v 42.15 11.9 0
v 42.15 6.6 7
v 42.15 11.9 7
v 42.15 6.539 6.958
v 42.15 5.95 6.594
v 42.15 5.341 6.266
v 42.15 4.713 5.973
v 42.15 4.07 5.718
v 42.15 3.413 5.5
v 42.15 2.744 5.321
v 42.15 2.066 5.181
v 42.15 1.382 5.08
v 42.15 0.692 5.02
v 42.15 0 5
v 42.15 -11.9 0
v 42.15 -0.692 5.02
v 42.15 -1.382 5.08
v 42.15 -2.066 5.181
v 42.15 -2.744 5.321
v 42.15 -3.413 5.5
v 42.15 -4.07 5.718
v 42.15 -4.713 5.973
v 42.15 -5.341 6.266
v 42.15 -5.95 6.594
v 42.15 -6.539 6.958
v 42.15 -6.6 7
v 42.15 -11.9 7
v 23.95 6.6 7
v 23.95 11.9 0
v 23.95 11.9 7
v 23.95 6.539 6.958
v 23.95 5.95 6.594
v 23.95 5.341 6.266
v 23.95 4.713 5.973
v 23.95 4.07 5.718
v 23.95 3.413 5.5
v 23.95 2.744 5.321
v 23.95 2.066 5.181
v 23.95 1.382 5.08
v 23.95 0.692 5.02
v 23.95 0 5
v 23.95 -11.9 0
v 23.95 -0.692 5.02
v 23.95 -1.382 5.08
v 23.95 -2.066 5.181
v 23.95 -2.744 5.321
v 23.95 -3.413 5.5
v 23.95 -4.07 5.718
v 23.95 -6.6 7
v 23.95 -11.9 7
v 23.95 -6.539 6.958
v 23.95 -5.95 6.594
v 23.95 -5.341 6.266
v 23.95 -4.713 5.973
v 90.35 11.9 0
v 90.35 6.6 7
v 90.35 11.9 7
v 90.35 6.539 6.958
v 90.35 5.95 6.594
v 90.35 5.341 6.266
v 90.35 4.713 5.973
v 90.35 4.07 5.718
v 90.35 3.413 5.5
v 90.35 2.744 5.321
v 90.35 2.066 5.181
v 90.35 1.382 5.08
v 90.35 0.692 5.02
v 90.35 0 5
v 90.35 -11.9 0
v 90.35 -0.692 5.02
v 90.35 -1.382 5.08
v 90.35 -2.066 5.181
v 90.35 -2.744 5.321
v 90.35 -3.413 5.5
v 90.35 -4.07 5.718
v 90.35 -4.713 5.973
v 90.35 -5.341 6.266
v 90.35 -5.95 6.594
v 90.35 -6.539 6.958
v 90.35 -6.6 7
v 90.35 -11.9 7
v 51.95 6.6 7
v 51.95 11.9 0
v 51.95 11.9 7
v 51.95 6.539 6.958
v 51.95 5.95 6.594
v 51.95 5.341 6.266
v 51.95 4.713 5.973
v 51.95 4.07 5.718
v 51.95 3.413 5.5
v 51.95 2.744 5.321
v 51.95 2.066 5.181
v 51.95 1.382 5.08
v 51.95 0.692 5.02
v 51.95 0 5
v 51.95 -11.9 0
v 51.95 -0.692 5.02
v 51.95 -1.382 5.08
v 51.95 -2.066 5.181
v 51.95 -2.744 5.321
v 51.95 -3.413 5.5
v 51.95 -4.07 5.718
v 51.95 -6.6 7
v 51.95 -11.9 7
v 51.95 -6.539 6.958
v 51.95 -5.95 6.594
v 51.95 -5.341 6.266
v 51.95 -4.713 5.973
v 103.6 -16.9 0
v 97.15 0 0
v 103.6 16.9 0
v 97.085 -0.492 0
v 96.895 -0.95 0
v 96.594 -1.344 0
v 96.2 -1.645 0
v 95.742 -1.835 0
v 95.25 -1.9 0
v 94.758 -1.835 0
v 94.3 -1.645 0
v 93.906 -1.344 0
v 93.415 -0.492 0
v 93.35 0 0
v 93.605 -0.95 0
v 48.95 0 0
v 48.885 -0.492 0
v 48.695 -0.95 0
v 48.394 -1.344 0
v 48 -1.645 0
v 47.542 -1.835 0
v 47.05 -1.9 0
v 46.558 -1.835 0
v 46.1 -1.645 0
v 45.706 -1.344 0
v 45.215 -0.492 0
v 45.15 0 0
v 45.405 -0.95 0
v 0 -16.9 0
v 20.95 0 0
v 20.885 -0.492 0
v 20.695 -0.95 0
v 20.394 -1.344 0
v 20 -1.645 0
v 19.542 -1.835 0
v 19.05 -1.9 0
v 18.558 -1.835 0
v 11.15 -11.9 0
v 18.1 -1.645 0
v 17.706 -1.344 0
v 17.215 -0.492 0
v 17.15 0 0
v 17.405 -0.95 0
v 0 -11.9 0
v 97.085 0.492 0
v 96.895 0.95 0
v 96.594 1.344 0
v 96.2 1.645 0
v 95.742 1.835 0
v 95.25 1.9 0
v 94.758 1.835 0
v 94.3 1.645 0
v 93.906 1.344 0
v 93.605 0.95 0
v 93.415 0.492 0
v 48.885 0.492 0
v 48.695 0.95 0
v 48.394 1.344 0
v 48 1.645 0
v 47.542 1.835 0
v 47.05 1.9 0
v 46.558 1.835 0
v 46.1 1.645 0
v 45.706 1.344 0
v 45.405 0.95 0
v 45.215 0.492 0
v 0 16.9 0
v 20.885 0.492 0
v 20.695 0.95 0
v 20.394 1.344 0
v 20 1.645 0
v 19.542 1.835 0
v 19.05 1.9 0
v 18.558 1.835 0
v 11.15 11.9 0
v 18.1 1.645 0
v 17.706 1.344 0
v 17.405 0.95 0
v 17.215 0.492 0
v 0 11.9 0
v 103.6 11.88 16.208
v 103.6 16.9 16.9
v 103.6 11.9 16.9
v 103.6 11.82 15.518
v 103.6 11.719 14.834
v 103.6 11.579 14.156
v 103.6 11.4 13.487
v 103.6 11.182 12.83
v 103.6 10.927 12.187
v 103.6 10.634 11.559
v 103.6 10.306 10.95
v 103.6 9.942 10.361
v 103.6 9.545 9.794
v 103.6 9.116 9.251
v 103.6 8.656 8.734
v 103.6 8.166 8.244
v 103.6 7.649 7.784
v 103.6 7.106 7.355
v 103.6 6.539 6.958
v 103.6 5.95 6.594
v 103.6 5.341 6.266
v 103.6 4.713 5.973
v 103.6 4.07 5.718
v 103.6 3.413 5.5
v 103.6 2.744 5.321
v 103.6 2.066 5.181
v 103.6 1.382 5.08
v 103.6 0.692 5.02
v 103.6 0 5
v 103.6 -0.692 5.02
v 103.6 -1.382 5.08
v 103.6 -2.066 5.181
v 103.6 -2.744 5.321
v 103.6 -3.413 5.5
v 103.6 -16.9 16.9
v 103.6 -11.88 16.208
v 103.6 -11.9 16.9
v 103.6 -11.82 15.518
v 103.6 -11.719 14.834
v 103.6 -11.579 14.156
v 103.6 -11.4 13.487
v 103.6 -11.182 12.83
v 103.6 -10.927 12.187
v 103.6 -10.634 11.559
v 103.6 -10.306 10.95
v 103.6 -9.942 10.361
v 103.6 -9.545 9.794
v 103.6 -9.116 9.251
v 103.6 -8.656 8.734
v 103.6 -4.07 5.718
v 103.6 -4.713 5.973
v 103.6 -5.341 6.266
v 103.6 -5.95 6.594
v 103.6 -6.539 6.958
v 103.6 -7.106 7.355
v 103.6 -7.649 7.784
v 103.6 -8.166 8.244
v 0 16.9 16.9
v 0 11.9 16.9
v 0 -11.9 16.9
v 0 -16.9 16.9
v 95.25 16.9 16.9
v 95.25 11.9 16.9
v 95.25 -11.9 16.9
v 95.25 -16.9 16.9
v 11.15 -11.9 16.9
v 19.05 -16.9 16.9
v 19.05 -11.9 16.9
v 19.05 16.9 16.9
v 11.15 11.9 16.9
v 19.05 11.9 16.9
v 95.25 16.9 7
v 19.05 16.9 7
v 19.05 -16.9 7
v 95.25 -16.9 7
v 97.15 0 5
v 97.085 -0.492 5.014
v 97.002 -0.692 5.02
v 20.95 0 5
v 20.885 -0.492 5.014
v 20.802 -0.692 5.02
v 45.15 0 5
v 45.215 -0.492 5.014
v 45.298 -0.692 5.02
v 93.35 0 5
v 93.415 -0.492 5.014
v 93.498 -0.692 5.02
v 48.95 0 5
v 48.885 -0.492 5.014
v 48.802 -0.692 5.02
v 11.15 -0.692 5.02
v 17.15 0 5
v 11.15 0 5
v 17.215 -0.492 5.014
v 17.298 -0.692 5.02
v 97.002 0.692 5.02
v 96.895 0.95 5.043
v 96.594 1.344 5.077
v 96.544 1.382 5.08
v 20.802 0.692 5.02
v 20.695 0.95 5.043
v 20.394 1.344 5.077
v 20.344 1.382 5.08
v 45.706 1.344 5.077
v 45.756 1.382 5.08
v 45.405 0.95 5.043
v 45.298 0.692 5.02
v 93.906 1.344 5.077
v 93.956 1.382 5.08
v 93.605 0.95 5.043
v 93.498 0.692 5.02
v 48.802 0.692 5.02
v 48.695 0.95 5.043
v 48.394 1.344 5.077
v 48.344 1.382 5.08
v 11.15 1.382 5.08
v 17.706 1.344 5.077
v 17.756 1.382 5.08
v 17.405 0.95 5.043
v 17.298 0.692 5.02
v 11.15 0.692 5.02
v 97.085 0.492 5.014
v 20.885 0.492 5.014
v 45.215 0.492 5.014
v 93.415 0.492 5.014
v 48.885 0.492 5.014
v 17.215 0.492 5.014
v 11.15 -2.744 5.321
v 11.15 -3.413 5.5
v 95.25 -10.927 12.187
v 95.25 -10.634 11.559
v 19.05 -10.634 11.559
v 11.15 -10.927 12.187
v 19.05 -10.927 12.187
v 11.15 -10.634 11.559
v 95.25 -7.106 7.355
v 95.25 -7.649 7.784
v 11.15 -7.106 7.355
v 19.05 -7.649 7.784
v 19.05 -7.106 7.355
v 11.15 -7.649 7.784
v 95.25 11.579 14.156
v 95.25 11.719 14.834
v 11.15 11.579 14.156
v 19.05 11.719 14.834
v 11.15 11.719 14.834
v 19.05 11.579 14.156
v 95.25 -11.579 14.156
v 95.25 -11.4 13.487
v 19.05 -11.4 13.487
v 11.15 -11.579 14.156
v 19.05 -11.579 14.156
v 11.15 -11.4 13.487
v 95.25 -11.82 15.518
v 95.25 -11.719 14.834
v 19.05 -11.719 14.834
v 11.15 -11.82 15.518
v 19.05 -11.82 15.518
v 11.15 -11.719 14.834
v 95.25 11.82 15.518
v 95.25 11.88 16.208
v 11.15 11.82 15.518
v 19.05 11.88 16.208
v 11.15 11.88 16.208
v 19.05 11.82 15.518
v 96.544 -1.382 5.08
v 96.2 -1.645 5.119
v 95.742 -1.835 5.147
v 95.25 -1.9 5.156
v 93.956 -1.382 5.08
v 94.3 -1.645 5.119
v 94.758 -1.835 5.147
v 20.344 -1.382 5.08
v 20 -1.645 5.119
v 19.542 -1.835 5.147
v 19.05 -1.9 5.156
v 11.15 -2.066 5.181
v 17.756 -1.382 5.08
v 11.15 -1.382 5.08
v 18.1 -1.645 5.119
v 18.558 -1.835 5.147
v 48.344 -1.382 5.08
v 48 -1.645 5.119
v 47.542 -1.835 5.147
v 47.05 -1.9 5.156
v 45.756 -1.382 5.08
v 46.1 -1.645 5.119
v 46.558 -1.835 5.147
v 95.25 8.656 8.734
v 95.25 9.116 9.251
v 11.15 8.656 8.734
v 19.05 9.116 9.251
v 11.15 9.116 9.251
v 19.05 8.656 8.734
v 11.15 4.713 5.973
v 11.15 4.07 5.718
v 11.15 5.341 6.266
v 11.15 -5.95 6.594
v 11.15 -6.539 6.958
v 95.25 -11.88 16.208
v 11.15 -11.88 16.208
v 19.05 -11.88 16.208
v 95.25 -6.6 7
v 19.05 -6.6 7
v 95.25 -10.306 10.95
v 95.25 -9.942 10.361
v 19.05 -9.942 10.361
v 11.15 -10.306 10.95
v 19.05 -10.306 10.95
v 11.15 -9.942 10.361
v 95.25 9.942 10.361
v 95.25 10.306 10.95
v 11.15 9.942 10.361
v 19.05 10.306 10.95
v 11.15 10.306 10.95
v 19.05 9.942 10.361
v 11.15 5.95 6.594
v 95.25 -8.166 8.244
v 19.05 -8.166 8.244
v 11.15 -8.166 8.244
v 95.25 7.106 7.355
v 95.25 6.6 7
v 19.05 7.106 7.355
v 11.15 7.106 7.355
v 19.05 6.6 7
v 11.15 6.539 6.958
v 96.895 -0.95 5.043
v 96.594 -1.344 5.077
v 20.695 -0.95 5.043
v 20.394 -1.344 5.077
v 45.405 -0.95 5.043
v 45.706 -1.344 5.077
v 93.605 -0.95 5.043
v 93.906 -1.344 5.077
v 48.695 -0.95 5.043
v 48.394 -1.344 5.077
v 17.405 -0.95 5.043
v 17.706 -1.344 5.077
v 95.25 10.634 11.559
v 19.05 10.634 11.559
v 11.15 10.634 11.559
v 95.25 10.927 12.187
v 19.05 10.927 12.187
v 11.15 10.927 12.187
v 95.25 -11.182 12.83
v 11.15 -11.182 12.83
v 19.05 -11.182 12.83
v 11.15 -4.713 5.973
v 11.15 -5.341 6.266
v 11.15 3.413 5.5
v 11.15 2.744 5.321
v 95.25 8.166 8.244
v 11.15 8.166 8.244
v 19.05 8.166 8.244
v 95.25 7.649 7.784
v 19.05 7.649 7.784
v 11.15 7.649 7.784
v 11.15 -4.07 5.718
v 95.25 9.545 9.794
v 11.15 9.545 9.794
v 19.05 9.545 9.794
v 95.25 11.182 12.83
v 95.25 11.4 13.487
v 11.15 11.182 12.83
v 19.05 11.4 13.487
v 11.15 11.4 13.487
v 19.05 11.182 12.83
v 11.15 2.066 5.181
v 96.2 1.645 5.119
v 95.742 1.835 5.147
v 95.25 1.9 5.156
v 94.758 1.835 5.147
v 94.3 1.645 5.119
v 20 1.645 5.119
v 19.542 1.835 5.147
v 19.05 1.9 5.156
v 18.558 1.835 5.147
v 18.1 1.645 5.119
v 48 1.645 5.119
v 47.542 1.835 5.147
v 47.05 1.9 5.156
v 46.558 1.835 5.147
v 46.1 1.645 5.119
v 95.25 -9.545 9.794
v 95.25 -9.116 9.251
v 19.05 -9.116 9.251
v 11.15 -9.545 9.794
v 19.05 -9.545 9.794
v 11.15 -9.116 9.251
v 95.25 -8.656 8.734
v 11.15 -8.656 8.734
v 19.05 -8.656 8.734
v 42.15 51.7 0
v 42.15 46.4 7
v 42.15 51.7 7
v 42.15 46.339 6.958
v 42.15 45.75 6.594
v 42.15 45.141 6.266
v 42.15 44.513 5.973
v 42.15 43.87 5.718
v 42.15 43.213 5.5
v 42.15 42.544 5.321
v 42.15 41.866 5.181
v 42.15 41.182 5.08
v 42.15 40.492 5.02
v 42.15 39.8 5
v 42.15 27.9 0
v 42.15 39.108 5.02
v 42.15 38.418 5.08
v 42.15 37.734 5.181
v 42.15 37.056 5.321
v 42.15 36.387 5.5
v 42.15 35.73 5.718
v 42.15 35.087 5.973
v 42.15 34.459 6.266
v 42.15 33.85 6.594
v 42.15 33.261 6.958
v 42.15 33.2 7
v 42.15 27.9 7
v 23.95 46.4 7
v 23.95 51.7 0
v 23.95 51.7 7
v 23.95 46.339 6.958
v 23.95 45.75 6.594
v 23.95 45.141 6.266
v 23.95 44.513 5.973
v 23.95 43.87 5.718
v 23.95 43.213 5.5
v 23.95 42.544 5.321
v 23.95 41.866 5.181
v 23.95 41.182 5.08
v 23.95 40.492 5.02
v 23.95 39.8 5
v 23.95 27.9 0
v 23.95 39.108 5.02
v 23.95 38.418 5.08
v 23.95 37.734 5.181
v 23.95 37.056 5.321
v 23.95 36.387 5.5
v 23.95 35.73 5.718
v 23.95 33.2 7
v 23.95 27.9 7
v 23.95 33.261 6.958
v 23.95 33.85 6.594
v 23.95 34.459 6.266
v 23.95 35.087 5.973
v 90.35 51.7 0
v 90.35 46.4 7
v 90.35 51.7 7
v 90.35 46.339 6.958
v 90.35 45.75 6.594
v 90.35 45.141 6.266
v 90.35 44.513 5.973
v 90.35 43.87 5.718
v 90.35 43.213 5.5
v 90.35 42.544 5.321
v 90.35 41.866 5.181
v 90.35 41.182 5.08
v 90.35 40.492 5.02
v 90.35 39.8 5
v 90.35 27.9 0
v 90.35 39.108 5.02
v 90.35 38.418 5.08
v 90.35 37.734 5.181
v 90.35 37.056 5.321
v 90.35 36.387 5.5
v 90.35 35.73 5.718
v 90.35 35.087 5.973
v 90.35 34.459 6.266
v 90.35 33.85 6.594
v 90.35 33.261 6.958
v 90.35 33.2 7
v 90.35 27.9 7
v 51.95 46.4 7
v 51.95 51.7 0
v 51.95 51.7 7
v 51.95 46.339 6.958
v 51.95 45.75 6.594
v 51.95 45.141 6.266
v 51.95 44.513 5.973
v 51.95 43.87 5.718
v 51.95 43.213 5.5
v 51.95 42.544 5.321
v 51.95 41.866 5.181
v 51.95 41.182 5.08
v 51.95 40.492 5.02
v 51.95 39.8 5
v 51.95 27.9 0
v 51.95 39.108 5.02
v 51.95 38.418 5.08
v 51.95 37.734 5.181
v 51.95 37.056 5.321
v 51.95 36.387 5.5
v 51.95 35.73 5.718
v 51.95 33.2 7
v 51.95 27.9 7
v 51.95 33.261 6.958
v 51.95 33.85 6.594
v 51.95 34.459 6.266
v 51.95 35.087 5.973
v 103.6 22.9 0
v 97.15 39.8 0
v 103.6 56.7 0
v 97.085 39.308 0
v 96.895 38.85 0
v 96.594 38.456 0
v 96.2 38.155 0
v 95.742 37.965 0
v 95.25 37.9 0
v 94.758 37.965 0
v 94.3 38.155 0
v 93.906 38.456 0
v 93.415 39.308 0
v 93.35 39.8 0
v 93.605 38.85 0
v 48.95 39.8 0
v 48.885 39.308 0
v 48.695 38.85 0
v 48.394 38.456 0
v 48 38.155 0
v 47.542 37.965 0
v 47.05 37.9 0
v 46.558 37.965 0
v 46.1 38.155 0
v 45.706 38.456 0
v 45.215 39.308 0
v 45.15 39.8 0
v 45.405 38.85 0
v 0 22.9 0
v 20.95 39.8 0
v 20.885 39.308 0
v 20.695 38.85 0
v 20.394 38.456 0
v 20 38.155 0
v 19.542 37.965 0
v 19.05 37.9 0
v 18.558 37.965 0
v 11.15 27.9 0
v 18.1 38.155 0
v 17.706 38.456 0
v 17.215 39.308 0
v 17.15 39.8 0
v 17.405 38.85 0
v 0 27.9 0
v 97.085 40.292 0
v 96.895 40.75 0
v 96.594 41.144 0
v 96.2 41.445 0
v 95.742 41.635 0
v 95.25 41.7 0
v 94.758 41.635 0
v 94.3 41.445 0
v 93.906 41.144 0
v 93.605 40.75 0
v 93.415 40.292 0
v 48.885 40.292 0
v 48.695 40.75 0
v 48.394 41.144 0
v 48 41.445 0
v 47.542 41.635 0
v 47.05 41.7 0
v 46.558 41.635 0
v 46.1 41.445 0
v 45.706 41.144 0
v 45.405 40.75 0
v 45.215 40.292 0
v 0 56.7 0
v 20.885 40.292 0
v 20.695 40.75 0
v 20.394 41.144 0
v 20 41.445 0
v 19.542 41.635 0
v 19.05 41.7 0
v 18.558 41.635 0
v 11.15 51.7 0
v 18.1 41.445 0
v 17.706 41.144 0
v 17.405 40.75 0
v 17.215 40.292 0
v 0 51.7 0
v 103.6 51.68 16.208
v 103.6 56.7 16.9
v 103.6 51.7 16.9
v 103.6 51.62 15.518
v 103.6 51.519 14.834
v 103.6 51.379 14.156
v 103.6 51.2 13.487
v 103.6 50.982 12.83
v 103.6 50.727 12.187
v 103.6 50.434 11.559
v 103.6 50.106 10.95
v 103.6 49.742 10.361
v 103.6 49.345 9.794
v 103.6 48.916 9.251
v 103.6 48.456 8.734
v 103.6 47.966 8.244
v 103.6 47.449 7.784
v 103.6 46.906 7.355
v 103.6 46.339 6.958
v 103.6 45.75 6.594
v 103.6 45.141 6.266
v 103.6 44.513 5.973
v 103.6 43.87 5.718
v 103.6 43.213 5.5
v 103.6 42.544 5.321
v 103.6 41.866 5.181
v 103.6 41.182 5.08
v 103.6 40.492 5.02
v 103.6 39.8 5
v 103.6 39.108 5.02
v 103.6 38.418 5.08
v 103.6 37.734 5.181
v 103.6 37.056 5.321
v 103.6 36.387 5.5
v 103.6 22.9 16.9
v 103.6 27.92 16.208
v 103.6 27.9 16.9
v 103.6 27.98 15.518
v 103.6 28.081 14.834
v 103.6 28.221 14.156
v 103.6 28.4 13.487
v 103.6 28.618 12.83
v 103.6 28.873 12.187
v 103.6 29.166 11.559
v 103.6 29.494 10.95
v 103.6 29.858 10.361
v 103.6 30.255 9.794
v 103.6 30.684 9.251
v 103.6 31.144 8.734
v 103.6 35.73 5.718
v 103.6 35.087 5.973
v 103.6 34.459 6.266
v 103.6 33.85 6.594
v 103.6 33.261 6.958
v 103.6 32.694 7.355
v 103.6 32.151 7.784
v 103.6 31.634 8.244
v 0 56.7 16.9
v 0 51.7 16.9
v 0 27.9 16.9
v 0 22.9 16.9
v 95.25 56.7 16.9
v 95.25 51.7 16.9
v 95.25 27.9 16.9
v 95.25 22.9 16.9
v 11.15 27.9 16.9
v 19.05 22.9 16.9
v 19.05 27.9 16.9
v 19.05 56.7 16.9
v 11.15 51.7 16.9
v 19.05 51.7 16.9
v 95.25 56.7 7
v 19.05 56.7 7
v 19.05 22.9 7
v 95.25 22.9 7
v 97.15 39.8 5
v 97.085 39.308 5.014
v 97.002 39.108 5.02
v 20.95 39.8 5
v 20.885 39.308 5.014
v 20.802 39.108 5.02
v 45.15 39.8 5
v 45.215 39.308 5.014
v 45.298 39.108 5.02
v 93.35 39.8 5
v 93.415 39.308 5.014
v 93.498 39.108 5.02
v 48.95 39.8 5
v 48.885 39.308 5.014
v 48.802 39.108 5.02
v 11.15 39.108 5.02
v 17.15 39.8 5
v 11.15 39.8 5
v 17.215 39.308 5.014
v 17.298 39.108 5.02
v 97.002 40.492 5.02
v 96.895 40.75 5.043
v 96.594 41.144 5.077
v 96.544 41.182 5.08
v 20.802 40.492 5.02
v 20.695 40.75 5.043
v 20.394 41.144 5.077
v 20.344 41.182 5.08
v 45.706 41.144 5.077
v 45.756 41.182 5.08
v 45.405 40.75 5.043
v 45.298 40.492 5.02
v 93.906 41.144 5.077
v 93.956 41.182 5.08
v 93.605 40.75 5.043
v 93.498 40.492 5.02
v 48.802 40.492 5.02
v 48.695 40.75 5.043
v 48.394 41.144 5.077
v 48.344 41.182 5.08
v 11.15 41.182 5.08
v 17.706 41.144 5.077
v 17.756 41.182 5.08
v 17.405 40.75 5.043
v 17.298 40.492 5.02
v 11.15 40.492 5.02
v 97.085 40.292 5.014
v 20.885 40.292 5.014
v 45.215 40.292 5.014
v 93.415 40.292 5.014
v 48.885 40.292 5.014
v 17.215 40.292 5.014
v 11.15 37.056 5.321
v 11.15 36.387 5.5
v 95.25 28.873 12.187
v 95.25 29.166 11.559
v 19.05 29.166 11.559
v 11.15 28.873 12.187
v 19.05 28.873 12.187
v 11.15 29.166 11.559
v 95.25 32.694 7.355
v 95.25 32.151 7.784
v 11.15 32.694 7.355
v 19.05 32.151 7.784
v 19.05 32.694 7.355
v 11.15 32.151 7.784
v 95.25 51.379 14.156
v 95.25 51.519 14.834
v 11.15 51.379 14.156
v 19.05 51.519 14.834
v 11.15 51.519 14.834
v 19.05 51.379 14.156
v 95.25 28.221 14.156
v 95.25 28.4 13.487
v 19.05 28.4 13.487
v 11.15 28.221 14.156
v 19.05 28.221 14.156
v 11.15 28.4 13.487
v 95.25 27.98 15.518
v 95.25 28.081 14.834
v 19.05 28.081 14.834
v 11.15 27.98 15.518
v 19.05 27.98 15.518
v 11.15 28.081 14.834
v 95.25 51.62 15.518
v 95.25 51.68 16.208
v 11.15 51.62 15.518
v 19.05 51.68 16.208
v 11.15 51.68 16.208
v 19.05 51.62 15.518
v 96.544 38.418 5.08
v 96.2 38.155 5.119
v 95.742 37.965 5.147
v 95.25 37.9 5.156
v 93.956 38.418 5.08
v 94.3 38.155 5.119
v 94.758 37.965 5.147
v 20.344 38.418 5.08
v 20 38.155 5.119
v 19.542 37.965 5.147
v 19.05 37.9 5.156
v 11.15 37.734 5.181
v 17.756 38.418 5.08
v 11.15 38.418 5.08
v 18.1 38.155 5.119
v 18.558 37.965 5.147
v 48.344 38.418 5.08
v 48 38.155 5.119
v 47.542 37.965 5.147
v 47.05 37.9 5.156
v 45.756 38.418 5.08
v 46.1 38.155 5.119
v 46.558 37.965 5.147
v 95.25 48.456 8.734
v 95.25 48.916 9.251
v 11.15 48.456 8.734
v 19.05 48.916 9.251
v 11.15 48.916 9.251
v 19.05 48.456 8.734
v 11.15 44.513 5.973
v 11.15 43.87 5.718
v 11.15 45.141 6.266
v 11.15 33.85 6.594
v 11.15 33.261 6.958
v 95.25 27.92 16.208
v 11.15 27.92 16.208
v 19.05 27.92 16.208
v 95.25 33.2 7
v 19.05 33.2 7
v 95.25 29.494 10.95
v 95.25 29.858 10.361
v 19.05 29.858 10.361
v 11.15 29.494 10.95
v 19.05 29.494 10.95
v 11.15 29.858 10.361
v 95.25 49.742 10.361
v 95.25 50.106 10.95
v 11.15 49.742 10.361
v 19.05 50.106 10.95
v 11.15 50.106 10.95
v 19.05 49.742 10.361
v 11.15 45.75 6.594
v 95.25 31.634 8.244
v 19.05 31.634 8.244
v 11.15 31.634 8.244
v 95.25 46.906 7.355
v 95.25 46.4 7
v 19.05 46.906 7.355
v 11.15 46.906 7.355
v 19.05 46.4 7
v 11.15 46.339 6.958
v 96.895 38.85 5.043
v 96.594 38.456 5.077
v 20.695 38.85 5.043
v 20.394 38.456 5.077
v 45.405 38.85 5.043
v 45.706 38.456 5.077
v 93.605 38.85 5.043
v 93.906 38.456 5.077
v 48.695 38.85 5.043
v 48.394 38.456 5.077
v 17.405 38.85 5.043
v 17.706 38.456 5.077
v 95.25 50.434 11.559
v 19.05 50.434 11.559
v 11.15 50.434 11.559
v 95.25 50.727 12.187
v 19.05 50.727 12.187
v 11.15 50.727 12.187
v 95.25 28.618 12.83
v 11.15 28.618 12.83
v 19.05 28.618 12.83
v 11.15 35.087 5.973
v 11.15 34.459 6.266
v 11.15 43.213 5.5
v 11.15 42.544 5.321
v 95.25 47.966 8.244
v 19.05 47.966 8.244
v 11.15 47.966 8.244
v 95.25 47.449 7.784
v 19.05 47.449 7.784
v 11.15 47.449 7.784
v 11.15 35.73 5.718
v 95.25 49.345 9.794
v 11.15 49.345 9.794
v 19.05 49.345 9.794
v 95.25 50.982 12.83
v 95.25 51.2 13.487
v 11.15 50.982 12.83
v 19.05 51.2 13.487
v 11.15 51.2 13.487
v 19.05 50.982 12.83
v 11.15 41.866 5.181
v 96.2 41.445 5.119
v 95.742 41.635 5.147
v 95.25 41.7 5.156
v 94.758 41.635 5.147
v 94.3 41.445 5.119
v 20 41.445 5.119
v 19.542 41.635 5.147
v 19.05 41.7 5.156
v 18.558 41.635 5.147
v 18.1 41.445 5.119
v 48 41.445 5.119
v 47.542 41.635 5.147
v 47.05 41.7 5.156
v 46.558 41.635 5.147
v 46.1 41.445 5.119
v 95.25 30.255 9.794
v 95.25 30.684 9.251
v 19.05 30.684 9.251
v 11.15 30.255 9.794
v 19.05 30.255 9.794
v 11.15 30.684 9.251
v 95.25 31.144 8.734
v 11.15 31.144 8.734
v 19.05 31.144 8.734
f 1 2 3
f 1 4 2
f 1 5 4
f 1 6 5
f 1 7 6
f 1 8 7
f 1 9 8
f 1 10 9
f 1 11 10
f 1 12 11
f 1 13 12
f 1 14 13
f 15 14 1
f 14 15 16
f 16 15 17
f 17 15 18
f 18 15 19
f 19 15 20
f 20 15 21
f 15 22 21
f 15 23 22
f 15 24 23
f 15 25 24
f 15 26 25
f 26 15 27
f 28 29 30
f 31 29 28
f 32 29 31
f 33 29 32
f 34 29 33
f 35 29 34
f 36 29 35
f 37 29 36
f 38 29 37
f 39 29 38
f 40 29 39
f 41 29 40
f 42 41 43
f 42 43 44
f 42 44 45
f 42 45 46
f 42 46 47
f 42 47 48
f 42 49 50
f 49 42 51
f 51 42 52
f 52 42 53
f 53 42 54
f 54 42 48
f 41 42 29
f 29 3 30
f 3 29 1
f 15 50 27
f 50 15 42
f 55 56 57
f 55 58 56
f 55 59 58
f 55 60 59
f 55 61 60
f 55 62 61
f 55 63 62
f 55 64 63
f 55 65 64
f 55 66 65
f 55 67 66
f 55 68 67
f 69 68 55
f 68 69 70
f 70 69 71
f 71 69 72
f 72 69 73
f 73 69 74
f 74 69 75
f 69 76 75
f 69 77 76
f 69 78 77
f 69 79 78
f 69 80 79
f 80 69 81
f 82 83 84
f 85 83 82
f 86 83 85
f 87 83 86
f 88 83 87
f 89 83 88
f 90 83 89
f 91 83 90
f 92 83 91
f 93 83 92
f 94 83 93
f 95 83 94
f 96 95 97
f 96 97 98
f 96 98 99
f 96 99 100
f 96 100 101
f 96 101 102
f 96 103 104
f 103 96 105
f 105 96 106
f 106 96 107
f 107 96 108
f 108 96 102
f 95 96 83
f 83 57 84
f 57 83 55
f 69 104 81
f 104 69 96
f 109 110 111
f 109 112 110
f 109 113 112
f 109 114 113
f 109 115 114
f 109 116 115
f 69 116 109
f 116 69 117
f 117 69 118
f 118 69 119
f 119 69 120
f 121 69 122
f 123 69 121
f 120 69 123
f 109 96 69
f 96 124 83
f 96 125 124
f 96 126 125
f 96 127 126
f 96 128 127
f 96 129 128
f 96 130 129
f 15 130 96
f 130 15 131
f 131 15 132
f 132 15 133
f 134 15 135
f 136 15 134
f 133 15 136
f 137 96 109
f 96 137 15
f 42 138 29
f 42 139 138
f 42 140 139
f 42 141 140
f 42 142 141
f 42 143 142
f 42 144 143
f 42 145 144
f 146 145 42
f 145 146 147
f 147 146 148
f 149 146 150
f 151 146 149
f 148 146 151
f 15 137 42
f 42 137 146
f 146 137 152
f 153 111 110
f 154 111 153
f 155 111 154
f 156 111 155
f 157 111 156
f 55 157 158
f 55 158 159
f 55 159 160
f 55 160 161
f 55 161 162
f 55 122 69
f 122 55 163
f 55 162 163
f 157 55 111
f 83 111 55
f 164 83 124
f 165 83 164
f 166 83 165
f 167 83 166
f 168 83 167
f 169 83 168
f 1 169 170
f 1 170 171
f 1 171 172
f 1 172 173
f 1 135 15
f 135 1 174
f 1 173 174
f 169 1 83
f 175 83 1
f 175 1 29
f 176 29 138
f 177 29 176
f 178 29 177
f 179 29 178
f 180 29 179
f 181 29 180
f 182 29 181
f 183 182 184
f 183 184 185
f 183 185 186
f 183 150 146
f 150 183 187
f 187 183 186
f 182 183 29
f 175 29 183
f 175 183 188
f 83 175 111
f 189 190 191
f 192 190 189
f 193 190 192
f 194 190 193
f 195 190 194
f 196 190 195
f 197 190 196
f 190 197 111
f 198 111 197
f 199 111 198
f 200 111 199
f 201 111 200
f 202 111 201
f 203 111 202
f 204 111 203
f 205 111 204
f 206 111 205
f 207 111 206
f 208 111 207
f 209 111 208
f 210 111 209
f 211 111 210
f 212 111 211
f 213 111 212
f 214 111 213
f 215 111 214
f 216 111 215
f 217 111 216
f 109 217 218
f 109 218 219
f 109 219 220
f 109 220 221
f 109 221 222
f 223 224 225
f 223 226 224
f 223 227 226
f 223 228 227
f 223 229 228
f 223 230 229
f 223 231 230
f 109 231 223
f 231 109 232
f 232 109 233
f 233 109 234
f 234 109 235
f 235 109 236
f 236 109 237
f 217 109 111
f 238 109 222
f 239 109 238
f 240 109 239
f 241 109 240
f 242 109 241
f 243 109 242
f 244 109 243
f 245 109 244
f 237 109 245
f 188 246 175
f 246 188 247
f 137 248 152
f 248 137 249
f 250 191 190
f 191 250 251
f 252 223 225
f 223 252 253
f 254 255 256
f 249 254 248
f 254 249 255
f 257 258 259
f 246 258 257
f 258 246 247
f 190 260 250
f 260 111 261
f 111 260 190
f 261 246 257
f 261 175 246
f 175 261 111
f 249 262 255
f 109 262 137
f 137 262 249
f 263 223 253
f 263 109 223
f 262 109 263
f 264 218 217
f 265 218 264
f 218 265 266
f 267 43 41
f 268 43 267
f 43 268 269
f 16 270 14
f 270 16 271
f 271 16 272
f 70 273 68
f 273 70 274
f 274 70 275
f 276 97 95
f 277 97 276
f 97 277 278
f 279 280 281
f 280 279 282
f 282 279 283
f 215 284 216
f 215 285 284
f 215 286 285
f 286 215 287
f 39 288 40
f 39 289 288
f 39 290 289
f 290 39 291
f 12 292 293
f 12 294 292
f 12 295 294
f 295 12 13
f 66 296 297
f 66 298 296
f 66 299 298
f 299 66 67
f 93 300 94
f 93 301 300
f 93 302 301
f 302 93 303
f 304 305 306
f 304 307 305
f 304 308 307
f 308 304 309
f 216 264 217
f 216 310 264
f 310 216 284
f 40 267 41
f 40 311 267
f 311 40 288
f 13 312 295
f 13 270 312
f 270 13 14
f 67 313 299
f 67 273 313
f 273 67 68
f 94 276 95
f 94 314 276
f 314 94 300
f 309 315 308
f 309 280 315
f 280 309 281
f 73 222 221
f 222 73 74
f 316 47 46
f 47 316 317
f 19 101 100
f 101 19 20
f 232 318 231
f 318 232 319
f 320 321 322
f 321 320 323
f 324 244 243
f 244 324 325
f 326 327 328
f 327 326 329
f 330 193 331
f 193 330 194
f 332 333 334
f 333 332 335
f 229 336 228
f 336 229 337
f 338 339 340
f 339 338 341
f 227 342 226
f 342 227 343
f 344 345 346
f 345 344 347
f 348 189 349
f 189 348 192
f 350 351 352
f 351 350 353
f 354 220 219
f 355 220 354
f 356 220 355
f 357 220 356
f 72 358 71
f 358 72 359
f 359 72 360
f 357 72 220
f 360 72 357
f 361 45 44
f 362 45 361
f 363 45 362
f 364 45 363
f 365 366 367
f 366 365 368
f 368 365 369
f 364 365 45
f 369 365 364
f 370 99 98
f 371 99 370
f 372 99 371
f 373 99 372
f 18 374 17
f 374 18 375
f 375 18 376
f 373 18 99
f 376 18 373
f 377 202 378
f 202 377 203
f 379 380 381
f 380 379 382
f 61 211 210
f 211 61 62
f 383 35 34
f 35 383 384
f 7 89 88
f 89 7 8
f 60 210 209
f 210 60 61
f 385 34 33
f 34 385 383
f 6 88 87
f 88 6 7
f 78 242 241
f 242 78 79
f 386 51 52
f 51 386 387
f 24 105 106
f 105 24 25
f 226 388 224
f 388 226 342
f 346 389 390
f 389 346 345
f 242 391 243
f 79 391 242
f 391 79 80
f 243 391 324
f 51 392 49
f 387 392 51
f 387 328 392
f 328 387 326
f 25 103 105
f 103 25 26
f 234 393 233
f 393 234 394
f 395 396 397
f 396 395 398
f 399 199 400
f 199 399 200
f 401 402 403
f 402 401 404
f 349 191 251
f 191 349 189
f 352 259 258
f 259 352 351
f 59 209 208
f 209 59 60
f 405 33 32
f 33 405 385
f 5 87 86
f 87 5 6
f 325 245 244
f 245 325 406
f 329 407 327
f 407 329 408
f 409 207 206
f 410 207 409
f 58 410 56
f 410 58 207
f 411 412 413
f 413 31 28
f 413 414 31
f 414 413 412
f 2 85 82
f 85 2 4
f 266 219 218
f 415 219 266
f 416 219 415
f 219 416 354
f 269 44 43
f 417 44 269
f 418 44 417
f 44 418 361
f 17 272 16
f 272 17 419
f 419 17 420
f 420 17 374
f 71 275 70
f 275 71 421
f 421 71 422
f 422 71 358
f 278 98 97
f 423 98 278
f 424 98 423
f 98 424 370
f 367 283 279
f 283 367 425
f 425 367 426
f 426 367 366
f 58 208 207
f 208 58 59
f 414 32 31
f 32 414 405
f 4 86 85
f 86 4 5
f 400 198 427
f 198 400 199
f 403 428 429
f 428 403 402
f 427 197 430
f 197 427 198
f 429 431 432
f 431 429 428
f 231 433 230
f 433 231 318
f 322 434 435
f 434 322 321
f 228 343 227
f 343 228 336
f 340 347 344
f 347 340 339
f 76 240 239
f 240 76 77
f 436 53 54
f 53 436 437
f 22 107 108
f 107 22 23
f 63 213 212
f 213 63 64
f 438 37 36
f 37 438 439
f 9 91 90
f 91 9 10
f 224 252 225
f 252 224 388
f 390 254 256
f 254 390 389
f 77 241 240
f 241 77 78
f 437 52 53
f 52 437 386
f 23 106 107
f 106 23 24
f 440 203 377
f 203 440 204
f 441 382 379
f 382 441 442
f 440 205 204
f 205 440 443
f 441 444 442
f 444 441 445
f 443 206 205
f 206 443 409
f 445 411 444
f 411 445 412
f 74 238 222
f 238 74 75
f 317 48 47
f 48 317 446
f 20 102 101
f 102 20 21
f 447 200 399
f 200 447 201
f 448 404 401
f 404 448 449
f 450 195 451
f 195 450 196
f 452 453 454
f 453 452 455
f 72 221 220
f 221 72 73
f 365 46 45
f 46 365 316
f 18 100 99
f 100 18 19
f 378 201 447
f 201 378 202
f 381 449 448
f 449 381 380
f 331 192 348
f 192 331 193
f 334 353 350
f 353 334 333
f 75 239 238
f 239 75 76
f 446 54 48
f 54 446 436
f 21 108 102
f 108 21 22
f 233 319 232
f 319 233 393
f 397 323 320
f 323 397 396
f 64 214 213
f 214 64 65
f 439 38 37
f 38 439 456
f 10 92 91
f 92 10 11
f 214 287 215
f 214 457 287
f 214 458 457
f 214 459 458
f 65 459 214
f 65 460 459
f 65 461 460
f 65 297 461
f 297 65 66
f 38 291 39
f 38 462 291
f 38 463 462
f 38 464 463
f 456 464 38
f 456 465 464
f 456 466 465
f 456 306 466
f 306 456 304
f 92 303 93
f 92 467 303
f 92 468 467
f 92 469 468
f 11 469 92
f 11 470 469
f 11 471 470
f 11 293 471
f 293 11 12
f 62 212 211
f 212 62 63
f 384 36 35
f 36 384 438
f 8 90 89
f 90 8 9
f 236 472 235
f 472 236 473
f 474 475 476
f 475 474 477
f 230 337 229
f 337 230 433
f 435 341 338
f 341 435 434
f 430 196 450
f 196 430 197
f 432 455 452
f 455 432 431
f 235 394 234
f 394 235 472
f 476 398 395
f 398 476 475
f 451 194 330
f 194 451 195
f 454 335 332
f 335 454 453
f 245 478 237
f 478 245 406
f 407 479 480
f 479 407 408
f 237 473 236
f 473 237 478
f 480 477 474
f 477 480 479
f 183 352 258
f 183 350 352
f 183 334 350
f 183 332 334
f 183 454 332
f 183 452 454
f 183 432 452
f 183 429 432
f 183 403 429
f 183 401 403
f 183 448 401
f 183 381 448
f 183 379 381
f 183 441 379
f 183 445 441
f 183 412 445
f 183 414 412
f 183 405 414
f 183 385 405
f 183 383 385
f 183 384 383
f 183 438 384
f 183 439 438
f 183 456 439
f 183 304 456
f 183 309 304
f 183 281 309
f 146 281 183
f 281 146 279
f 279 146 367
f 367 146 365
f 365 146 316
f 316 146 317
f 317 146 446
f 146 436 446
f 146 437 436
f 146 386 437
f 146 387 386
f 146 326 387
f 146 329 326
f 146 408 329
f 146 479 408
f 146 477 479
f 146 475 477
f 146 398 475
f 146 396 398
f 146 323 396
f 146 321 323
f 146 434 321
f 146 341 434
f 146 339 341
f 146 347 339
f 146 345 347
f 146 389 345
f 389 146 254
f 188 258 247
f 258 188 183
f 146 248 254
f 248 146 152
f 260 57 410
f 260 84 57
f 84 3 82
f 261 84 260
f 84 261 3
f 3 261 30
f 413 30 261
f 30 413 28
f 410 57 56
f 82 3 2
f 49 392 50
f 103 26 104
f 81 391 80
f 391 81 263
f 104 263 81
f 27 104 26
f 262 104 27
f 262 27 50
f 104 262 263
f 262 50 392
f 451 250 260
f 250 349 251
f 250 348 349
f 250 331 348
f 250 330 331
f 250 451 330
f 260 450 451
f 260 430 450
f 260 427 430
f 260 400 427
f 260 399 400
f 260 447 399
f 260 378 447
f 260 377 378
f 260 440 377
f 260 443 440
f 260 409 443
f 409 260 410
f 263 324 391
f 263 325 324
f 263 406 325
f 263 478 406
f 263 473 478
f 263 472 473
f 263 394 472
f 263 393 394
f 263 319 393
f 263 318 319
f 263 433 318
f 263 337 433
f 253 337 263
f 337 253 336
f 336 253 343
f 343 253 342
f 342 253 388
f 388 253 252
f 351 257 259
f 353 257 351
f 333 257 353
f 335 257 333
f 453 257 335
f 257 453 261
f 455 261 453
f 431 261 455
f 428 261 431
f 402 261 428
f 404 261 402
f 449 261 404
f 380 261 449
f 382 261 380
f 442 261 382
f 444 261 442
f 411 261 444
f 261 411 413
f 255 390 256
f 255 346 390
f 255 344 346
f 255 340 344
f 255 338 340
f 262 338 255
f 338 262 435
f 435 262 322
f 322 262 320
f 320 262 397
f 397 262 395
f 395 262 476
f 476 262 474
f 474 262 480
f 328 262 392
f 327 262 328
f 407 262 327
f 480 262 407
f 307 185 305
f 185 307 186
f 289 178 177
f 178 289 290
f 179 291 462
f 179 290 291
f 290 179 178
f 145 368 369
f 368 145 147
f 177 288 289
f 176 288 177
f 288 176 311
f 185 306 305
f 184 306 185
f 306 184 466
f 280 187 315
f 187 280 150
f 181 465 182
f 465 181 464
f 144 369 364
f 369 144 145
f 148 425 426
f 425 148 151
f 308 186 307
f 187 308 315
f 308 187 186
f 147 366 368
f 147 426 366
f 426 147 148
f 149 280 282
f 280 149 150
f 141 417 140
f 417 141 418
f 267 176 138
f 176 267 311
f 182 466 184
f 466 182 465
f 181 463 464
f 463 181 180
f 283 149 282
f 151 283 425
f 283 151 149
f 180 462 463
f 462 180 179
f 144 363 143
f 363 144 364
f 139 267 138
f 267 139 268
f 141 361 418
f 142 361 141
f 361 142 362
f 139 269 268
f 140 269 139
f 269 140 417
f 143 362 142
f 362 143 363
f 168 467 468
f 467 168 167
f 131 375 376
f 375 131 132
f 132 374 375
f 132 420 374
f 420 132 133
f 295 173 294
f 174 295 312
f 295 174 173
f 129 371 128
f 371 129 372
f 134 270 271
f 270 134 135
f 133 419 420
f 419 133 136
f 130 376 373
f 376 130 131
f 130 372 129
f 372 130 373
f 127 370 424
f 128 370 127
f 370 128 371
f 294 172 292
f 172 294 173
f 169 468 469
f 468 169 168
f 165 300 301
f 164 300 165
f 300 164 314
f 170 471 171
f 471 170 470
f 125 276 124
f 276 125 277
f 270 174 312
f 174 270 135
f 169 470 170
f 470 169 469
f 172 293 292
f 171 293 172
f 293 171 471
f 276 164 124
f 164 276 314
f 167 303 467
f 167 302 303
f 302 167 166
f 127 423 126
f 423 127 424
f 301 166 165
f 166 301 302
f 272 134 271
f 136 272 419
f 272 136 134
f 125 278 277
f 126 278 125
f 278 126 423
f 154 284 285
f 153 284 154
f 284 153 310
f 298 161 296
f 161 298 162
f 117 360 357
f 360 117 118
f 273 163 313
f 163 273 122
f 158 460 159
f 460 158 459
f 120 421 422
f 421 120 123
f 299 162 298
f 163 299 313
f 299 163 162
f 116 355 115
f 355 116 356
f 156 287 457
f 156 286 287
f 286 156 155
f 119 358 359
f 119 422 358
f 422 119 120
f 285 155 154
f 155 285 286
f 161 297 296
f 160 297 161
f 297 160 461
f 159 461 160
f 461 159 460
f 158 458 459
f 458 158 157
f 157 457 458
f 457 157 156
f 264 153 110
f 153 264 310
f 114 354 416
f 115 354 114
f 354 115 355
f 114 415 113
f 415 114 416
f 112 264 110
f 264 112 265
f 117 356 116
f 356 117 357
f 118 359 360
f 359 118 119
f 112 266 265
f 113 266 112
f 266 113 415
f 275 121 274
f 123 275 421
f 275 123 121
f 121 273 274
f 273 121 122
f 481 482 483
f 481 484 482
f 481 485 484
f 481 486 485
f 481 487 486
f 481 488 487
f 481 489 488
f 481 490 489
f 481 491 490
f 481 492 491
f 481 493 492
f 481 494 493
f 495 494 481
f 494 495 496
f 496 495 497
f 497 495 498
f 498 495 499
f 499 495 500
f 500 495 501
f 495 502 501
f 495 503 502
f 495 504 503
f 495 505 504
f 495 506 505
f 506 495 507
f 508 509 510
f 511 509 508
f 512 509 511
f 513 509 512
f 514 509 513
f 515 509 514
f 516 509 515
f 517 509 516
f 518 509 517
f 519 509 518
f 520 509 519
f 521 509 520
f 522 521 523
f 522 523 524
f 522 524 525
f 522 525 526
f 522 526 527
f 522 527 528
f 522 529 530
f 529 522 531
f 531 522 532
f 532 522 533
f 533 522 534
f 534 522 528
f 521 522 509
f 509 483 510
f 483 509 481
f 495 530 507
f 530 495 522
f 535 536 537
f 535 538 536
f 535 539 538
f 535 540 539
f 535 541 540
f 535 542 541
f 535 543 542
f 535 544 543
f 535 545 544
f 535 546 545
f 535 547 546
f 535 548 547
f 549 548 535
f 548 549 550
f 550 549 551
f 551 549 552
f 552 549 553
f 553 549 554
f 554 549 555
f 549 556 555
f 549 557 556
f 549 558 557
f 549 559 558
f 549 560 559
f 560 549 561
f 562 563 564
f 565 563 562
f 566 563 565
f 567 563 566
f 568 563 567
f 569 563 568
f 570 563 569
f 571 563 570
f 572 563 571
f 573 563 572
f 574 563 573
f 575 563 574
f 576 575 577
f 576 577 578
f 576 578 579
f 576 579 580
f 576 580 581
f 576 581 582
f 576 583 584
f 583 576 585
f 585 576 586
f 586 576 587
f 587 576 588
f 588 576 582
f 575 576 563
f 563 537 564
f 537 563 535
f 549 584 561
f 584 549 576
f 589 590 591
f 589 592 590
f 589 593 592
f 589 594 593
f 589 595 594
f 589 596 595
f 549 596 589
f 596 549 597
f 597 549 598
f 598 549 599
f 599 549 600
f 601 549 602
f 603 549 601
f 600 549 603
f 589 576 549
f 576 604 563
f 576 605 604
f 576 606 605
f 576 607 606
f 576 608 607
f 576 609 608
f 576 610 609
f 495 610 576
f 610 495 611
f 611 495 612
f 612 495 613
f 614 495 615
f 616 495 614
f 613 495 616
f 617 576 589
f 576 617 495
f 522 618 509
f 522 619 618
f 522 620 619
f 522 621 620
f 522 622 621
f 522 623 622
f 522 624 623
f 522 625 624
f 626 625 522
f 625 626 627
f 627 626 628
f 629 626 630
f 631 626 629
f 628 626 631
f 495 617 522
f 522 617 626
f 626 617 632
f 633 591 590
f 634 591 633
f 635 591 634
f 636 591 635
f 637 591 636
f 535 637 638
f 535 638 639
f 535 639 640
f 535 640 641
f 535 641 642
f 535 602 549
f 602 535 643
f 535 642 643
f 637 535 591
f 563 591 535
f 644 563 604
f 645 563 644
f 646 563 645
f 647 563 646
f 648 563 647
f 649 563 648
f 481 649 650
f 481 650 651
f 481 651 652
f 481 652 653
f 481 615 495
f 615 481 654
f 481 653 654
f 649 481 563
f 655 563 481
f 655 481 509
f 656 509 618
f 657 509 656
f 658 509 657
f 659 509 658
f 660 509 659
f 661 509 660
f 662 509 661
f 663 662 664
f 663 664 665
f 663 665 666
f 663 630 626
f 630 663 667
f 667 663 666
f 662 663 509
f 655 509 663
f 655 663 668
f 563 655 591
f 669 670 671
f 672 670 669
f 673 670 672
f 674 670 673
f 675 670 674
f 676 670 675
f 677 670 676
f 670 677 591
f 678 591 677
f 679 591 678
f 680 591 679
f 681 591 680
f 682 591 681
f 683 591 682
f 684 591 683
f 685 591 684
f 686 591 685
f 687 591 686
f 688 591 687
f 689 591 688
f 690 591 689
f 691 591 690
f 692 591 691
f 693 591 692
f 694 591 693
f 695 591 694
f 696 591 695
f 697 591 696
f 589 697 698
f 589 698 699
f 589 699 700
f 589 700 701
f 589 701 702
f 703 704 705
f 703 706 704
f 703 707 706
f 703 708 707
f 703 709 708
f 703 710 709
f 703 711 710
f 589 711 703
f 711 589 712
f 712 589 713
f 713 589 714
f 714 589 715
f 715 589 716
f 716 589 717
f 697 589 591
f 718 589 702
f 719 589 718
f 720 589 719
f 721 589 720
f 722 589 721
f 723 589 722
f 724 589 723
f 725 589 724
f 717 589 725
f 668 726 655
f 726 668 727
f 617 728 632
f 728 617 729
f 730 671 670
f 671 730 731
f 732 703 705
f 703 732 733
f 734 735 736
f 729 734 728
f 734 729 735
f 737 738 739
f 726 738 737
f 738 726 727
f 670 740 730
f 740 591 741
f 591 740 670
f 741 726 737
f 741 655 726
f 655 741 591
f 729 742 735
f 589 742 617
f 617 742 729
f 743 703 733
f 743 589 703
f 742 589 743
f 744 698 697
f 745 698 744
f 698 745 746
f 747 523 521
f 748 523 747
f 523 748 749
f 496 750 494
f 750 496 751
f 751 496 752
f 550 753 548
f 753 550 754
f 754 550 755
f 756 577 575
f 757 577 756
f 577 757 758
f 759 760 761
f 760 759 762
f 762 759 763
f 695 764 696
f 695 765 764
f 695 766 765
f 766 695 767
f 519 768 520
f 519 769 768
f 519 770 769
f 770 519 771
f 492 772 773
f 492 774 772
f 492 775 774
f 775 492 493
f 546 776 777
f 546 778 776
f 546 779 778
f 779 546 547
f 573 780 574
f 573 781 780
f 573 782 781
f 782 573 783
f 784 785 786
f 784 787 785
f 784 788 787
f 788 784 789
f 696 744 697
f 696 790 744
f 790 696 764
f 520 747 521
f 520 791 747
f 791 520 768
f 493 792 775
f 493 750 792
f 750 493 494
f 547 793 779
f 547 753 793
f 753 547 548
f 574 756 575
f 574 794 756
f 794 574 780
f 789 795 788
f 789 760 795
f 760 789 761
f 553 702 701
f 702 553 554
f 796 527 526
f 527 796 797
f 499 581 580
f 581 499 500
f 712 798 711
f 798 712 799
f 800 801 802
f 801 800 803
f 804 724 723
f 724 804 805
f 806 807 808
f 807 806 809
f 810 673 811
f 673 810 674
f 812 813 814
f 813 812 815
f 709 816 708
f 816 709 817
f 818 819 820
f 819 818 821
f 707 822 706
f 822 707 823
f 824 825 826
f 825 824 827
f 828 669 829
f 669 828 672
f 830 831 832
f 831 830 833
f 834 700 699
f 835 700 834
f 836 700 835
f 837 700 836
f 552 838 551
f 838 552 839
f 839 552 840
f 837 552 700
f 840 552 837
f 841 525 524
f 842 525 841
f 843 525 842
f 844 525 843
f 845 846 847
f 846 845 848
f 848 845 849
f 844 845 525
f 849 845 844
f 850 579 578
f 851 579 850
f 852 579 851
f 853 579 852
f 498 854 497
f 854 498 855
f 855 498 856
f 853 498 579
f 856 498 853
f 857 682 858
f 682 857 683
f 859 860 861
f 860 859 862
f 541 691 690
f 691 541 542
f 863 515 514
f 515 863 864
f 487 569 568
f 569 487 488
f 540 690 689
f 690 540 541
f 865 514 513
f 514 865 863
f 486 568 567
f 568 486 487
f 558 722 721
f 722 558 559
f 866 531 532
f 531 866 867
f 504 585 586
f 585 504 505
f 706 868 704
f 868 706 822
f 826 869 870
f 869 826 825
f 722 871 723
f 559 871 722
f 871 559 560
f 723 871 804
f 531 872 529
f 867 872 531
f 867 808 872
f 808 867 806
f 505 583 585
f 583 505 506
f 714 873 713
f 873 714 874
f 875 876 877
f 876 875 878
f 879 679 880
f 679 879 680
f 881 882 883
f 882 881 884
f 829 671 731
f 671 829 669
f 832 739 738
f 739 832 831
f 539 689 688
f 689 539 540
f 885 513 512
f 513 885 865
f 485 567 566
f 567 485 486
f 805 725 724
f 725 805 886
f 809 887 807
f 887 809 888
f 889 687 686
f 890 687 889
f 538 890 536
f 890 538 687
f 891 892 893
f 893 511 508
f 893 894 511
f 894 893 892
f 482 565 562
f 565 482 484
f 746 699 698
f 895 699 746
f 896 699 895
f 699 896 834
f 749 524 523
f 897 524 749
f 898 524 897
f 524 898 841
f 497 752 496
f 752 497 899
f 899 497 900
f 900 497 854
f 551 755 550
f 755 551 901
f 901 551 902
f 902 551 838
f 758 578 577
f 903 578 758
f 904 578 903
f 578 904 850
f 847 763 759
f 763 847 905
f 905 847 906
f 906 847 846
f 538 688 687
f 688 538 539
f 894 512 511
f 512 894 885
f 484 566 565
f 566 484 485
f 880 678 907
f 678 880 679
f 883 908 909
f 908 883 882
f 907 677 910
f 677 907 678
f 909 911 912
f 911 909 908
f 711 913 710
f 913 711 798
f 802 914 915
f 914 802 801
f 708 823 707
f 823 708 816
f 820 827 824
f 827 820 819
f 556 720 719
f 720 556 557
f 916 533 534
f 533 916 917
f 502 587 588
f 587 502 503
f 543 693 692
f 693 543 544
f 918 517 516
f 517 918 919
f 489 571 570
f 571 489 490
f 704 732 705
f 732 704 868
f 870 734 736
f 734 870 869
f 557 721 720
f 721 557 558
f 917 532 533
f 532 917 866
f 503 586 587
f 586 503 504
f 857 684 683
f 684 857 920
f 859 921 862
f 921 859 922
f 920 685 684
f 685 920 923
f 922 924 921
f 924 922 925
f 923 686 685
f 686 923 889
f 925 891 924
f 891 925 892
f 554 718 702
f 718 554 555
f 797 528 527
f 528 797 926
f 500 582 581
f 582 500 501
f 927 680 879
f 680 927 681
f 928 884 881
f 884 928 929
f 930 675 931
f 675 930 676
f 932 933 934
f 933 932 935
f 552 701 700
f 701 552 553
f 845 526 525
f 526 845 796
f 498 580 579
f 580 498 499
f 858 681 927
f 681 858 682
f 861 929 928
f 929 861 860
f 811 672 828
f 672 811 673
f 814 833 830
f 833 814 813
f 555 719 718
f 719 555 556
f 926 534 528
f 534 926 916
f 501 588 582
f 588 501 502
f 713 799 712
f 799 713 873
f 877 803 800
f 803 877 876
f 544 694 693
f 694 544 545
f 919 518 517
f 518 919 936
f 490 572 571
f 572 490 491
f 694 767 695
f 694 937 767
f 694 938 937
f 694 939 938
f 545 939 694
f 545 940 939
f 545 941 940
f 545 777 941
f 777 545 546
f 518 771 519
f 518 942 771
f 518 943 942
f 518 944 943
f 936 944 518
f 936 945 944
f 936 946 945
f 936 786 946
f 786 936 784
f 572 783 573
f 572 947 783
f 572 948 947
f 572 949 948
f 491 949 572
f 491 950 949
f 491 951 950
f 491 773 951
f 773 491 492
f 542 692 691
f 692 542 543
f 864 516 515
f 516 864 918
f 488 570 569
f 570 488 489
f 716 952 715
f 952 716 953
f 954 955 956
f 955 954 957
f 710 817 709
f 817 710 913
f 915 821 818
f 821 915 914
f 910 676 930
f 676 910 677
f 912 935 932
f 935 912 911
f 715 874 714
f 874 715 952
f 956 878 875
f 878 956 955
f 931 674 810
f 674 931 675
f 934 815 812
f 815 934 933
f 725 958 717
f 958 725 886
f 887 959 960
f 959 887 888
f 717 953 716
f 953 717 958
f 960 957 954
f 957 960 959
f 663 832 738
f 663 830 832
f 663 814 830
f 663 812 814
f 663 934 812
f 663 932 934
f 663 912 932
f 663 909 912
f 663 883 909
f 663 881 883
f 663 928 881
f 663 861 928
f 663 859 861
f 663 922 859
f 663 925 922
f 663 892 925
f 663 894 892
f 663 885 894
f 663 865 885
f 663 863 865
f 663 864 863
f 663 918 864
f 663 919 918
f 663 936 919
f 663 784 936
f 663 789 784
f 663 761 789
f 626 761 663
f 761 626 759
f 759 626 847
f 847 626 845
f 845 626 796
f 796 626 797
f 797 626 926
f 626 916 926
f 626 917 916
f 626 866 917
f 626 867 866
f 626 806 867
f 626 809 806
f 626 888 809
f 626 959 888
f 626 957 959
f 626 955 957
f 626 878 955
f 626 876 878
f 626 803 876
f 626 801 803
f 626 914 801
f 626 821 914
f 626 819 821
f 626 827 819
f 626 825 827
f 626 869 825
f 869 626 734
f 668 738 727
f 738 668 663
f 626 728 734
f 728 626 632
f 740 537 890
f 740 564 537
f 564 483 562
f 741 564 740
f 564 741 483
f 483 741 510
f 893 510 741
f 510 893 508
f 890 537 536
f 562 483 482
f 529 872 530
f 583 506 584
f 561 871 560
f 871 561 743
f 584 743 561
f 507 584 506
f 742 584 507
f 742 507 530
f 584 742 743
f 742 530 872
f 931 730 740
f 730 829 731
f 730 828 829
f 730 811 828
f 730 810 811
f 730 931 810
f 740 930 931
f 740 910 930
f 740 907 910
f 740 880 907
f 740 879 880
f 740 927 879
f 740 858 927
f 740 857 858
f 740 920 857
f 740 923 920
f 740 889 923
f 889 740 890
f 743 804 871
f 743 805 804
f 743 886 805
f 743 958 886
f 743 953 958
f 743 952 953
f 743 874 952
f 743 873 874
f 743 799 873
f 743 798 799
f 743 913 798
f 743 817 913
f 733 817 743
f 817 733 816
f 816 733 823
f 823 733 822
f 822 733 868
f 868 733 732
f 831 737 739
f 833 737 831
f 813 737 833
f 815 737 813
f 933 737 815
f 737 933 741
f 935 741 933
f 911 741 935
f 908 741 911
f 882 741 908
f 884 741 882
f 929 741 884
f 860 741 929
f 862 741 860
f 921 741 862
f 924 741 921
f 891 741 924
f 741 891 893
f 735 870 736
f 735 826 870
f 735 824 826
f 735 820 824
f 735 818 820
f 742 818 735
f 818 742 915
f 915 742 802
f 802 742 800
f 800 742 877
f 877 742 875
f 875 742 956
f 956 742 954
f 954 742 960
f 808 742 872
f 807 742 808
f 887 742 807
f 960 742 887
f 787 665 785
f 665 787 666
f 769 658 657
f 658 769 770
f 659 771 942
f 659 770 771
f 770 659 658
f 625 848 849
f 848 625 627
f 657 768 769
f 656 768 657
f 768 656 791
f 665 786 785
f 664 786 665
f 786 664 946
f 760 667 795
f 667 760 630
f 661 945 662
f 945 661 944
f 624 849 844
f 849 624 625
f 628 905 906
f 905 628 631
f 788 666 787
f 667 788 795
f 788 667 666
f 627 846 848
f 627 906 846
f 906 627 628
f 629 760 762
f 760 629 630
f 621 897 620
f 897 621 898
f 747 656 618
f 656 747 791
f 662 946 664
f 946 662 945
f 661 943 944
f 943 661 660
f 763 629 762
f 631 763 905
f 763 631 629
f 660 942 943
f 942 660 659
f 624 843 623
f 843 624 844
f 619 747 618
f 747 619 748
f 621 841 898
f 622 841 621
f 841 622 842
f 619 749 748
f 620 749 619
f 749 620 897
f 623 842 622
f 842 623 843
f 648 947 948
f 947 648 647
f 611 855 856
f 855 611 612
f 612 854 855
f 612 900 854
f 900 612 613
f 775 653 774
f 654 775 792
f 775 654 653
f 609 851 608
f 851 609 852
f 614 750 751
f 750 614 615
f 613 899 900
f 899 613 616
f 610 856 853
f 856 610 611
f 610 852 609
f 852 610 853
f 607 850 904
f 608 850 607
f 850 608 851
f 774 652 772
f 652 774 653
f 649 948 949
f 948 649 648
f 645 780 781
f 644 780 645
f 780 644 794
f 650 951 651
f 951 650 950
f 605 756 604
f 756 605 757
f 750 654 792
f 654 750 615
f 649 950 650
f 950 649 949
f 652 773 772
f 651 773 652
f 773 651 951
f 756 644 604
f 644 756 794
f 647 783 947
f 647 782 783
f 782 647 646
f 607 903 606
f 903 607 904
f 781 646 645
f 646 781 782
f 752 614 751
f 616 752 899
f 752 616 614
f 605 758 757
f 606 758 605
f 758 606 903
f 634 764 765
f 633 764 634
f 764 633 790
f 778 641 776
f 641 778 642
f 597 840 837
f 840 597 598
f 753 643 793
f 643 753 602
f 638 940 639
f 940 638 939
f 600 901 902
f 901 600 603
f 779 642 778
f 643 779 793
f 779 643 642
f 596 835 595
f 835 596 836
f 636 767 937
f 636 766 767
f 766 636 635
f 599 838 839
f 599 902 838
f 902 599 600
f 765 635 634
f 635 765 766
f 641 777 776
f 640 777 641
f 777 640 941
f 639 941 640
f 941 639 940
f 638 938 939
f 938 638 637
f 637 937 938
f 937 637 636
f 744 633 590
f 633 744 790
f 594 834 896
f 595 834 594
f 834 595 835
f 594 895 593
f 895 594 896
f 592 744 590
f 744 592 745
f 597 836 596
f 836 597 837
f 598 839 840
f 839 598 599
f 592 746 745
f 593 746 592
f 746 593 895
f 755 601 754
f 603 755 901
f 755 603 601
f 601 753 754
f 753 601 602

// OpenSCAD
//Drill guide for Mostly Printed CNC Z Pipe
//7/3/2015  By: David Bunch
//Revised center cuts for larger Diameter holes to work better
//
//Designed for Bosch Toolholder with Dust cover using 2 parts
//76.25mm 1st & 3rd hole
//28.01mm 1st & 2nd hole
//48.24mm 2nd & 3rd hole

//CUSTOMIZER VARIABLES

//1. Number of Nuts
NumNuts = 3;    //usually 2, but need 3 for Bosch with Vac attachment

//2. Spacing between Nuts (Standard is 76.2mm)
NutSpacing = 76.2;      //(I used 53mm for the rotary tool I am using)

//3. Spacing between 1st & 2nd Nut
NutSpacing2 = 28;    //Use 0 if only using 2 nuts

//4. Dia of Drill Hole (9/64" Drill bit, Added .2mm for slip fit)
//M3 = 3.8;
DrSize = 3.8;

//5. Pipe Dia. to Use (Added 0.8 for slight tight fit)
OD = 23.8;              //23.7mm was a little tight & 24.0 was a little loose for me

//6. Thickness at bottom of Pipe
Thickness = 5;

//7. Resolution of Pipe (108 gives .688mm length segments)
Pipe_res = 108;

//8. Resolution of holes (24 gives .497mm length segments)
Hole_res = 24;

//9. Offset from Left for 1st Nut Trap
LtNutOffset = 19.05;      //Original Design is 19.05mm

//10. Offset from Right of 2nd Nut Trap (Original is 6.35mm)
RtNutOffset = 8.35;       //(I decided to add 2mm to this gap)

//11. Center Clamp Width
Cl_Wid = 6;

//12. Number of Holes (1 or 2)
Num_Holes=2;

//13. Print 1 or 2 Nut Traps
Qty = 2;

//CUSTOMIZER VARIABLES END
//----------------------------------------
//Begin calculations based on input variables
MidNutOffset = LtNutOffset + NutSpacing2;
echo("MidNutOffset = ", MidNutOffset);
TotCenGap=NutSpacing - DrSize - 12;         //I use 6mm plastic around holes
echo("TotCenGap = ",TotCenGap);

DrRad = DrSize / 2;
echo("DrRad = ", DrRad);
THK = OD /2 + Thickness;

DrLen = OD + Thickness + Thickness+2;

echo("THK = ",THK);

Width = OD + Thickness + Thickness;
echo("Width = ",Width);

WidSlice = Width + 2;
Rad = OD / 2;
echo("Rad = ", Rad);

Ht = LtNutOffset + NutSpacing + RtNutOffset;
echo("Ht = ", Ht);

CenCub_Z2 = LtNutOffset + DrRad + 3;         //6mm of plastic each side of hole

CenCub_Z1 = MidNutOffset + DrRad + 3;

CenCubLen1 = NutSpacing - NutSpacing2 - (6 + DrSize);                     //Use this if Cl_Wid = 0;
//CenCubLen2 = (TotCenGap - Cl_Wid) / 2;
CenCubLen2 = NutSpacing2 - (6 + DrSize);

echo("CenCubLen1 = ", CenCubLen1);
echo("CenCubLen2 = ", CenCubLen2);
//translate([LtNutOffset,0,0])
//%cube([DrRad + 3,4,10]);
module Base()
{
    translate([0,0,THK])
    rotate([0,90,0])
    difference()
    {
        translate([0,-THK])
        cube([THK,Width,Ht]);                   //Basic starting cube
        translate([0,0,-1])
        cylinder(d=OD,h=Ht+2,$fn=Pipe_res);     //Cut for where pipe is laid
        if (Cl_Wid > 0)
        {
            translate([-1,-Rad,CenCub_Z2])
            cube([OD,OD,CenCubLen2]);           //cube cut out of 1st part of center
            translate([-1,-Rad,CenCub_Z1])
            cube([OD,OD,CenCubLen1]);           //cube cut out of 2nd part of center
        } else {
            translate([-1,-Rad,CenCub_Z])
            cube([OD,OD,CenCubLen1]);          //cube cut out of center
        }
        translate([-1,-Rad,-1])
        cube([OD,OD,(LtNutOffset - DrRad - 6) + 1]);         //Slice a cube cut at left side
        translate([-(Thickness+2),-(WidSlice/2),LtNutOffset])
        cube([THK,WidSlice,NutSpacing]);        //Slice across Top for less plastic

        translate([0,0,LtNutOffset])
        rotate([0,90,0])
        cylinder(d=DrSize,h=DrLen,center=true,$fn=Hole_res);       //Drill Bottom Hole
        translate([0,0,LtNutOffset+NutSpacing2])
        rotate([0,90,0])
        cylinder(d=DrSize,h=DrLen,center=true,$fn=Hole_res);       //Drill Middle Hole
        if (Num_Holes == 2)
        {
                translate([0,0,LtNutOffset+NutSpacing])
                rotate([0,90,0])
                cylinder(d=DrSize,h=DrLen,center=true,$fn=Hole_res);    //Drill Top Hole
        }
    }
}
            //translate([-1,-Rad,CenCub_Z])
            //cube([OD,OD,CenCubLen2]);           //cube cut out of 1st part of center
Base();
if (Qty == 2)
{
    translate([0,Width+6,0])
    Base();
}
